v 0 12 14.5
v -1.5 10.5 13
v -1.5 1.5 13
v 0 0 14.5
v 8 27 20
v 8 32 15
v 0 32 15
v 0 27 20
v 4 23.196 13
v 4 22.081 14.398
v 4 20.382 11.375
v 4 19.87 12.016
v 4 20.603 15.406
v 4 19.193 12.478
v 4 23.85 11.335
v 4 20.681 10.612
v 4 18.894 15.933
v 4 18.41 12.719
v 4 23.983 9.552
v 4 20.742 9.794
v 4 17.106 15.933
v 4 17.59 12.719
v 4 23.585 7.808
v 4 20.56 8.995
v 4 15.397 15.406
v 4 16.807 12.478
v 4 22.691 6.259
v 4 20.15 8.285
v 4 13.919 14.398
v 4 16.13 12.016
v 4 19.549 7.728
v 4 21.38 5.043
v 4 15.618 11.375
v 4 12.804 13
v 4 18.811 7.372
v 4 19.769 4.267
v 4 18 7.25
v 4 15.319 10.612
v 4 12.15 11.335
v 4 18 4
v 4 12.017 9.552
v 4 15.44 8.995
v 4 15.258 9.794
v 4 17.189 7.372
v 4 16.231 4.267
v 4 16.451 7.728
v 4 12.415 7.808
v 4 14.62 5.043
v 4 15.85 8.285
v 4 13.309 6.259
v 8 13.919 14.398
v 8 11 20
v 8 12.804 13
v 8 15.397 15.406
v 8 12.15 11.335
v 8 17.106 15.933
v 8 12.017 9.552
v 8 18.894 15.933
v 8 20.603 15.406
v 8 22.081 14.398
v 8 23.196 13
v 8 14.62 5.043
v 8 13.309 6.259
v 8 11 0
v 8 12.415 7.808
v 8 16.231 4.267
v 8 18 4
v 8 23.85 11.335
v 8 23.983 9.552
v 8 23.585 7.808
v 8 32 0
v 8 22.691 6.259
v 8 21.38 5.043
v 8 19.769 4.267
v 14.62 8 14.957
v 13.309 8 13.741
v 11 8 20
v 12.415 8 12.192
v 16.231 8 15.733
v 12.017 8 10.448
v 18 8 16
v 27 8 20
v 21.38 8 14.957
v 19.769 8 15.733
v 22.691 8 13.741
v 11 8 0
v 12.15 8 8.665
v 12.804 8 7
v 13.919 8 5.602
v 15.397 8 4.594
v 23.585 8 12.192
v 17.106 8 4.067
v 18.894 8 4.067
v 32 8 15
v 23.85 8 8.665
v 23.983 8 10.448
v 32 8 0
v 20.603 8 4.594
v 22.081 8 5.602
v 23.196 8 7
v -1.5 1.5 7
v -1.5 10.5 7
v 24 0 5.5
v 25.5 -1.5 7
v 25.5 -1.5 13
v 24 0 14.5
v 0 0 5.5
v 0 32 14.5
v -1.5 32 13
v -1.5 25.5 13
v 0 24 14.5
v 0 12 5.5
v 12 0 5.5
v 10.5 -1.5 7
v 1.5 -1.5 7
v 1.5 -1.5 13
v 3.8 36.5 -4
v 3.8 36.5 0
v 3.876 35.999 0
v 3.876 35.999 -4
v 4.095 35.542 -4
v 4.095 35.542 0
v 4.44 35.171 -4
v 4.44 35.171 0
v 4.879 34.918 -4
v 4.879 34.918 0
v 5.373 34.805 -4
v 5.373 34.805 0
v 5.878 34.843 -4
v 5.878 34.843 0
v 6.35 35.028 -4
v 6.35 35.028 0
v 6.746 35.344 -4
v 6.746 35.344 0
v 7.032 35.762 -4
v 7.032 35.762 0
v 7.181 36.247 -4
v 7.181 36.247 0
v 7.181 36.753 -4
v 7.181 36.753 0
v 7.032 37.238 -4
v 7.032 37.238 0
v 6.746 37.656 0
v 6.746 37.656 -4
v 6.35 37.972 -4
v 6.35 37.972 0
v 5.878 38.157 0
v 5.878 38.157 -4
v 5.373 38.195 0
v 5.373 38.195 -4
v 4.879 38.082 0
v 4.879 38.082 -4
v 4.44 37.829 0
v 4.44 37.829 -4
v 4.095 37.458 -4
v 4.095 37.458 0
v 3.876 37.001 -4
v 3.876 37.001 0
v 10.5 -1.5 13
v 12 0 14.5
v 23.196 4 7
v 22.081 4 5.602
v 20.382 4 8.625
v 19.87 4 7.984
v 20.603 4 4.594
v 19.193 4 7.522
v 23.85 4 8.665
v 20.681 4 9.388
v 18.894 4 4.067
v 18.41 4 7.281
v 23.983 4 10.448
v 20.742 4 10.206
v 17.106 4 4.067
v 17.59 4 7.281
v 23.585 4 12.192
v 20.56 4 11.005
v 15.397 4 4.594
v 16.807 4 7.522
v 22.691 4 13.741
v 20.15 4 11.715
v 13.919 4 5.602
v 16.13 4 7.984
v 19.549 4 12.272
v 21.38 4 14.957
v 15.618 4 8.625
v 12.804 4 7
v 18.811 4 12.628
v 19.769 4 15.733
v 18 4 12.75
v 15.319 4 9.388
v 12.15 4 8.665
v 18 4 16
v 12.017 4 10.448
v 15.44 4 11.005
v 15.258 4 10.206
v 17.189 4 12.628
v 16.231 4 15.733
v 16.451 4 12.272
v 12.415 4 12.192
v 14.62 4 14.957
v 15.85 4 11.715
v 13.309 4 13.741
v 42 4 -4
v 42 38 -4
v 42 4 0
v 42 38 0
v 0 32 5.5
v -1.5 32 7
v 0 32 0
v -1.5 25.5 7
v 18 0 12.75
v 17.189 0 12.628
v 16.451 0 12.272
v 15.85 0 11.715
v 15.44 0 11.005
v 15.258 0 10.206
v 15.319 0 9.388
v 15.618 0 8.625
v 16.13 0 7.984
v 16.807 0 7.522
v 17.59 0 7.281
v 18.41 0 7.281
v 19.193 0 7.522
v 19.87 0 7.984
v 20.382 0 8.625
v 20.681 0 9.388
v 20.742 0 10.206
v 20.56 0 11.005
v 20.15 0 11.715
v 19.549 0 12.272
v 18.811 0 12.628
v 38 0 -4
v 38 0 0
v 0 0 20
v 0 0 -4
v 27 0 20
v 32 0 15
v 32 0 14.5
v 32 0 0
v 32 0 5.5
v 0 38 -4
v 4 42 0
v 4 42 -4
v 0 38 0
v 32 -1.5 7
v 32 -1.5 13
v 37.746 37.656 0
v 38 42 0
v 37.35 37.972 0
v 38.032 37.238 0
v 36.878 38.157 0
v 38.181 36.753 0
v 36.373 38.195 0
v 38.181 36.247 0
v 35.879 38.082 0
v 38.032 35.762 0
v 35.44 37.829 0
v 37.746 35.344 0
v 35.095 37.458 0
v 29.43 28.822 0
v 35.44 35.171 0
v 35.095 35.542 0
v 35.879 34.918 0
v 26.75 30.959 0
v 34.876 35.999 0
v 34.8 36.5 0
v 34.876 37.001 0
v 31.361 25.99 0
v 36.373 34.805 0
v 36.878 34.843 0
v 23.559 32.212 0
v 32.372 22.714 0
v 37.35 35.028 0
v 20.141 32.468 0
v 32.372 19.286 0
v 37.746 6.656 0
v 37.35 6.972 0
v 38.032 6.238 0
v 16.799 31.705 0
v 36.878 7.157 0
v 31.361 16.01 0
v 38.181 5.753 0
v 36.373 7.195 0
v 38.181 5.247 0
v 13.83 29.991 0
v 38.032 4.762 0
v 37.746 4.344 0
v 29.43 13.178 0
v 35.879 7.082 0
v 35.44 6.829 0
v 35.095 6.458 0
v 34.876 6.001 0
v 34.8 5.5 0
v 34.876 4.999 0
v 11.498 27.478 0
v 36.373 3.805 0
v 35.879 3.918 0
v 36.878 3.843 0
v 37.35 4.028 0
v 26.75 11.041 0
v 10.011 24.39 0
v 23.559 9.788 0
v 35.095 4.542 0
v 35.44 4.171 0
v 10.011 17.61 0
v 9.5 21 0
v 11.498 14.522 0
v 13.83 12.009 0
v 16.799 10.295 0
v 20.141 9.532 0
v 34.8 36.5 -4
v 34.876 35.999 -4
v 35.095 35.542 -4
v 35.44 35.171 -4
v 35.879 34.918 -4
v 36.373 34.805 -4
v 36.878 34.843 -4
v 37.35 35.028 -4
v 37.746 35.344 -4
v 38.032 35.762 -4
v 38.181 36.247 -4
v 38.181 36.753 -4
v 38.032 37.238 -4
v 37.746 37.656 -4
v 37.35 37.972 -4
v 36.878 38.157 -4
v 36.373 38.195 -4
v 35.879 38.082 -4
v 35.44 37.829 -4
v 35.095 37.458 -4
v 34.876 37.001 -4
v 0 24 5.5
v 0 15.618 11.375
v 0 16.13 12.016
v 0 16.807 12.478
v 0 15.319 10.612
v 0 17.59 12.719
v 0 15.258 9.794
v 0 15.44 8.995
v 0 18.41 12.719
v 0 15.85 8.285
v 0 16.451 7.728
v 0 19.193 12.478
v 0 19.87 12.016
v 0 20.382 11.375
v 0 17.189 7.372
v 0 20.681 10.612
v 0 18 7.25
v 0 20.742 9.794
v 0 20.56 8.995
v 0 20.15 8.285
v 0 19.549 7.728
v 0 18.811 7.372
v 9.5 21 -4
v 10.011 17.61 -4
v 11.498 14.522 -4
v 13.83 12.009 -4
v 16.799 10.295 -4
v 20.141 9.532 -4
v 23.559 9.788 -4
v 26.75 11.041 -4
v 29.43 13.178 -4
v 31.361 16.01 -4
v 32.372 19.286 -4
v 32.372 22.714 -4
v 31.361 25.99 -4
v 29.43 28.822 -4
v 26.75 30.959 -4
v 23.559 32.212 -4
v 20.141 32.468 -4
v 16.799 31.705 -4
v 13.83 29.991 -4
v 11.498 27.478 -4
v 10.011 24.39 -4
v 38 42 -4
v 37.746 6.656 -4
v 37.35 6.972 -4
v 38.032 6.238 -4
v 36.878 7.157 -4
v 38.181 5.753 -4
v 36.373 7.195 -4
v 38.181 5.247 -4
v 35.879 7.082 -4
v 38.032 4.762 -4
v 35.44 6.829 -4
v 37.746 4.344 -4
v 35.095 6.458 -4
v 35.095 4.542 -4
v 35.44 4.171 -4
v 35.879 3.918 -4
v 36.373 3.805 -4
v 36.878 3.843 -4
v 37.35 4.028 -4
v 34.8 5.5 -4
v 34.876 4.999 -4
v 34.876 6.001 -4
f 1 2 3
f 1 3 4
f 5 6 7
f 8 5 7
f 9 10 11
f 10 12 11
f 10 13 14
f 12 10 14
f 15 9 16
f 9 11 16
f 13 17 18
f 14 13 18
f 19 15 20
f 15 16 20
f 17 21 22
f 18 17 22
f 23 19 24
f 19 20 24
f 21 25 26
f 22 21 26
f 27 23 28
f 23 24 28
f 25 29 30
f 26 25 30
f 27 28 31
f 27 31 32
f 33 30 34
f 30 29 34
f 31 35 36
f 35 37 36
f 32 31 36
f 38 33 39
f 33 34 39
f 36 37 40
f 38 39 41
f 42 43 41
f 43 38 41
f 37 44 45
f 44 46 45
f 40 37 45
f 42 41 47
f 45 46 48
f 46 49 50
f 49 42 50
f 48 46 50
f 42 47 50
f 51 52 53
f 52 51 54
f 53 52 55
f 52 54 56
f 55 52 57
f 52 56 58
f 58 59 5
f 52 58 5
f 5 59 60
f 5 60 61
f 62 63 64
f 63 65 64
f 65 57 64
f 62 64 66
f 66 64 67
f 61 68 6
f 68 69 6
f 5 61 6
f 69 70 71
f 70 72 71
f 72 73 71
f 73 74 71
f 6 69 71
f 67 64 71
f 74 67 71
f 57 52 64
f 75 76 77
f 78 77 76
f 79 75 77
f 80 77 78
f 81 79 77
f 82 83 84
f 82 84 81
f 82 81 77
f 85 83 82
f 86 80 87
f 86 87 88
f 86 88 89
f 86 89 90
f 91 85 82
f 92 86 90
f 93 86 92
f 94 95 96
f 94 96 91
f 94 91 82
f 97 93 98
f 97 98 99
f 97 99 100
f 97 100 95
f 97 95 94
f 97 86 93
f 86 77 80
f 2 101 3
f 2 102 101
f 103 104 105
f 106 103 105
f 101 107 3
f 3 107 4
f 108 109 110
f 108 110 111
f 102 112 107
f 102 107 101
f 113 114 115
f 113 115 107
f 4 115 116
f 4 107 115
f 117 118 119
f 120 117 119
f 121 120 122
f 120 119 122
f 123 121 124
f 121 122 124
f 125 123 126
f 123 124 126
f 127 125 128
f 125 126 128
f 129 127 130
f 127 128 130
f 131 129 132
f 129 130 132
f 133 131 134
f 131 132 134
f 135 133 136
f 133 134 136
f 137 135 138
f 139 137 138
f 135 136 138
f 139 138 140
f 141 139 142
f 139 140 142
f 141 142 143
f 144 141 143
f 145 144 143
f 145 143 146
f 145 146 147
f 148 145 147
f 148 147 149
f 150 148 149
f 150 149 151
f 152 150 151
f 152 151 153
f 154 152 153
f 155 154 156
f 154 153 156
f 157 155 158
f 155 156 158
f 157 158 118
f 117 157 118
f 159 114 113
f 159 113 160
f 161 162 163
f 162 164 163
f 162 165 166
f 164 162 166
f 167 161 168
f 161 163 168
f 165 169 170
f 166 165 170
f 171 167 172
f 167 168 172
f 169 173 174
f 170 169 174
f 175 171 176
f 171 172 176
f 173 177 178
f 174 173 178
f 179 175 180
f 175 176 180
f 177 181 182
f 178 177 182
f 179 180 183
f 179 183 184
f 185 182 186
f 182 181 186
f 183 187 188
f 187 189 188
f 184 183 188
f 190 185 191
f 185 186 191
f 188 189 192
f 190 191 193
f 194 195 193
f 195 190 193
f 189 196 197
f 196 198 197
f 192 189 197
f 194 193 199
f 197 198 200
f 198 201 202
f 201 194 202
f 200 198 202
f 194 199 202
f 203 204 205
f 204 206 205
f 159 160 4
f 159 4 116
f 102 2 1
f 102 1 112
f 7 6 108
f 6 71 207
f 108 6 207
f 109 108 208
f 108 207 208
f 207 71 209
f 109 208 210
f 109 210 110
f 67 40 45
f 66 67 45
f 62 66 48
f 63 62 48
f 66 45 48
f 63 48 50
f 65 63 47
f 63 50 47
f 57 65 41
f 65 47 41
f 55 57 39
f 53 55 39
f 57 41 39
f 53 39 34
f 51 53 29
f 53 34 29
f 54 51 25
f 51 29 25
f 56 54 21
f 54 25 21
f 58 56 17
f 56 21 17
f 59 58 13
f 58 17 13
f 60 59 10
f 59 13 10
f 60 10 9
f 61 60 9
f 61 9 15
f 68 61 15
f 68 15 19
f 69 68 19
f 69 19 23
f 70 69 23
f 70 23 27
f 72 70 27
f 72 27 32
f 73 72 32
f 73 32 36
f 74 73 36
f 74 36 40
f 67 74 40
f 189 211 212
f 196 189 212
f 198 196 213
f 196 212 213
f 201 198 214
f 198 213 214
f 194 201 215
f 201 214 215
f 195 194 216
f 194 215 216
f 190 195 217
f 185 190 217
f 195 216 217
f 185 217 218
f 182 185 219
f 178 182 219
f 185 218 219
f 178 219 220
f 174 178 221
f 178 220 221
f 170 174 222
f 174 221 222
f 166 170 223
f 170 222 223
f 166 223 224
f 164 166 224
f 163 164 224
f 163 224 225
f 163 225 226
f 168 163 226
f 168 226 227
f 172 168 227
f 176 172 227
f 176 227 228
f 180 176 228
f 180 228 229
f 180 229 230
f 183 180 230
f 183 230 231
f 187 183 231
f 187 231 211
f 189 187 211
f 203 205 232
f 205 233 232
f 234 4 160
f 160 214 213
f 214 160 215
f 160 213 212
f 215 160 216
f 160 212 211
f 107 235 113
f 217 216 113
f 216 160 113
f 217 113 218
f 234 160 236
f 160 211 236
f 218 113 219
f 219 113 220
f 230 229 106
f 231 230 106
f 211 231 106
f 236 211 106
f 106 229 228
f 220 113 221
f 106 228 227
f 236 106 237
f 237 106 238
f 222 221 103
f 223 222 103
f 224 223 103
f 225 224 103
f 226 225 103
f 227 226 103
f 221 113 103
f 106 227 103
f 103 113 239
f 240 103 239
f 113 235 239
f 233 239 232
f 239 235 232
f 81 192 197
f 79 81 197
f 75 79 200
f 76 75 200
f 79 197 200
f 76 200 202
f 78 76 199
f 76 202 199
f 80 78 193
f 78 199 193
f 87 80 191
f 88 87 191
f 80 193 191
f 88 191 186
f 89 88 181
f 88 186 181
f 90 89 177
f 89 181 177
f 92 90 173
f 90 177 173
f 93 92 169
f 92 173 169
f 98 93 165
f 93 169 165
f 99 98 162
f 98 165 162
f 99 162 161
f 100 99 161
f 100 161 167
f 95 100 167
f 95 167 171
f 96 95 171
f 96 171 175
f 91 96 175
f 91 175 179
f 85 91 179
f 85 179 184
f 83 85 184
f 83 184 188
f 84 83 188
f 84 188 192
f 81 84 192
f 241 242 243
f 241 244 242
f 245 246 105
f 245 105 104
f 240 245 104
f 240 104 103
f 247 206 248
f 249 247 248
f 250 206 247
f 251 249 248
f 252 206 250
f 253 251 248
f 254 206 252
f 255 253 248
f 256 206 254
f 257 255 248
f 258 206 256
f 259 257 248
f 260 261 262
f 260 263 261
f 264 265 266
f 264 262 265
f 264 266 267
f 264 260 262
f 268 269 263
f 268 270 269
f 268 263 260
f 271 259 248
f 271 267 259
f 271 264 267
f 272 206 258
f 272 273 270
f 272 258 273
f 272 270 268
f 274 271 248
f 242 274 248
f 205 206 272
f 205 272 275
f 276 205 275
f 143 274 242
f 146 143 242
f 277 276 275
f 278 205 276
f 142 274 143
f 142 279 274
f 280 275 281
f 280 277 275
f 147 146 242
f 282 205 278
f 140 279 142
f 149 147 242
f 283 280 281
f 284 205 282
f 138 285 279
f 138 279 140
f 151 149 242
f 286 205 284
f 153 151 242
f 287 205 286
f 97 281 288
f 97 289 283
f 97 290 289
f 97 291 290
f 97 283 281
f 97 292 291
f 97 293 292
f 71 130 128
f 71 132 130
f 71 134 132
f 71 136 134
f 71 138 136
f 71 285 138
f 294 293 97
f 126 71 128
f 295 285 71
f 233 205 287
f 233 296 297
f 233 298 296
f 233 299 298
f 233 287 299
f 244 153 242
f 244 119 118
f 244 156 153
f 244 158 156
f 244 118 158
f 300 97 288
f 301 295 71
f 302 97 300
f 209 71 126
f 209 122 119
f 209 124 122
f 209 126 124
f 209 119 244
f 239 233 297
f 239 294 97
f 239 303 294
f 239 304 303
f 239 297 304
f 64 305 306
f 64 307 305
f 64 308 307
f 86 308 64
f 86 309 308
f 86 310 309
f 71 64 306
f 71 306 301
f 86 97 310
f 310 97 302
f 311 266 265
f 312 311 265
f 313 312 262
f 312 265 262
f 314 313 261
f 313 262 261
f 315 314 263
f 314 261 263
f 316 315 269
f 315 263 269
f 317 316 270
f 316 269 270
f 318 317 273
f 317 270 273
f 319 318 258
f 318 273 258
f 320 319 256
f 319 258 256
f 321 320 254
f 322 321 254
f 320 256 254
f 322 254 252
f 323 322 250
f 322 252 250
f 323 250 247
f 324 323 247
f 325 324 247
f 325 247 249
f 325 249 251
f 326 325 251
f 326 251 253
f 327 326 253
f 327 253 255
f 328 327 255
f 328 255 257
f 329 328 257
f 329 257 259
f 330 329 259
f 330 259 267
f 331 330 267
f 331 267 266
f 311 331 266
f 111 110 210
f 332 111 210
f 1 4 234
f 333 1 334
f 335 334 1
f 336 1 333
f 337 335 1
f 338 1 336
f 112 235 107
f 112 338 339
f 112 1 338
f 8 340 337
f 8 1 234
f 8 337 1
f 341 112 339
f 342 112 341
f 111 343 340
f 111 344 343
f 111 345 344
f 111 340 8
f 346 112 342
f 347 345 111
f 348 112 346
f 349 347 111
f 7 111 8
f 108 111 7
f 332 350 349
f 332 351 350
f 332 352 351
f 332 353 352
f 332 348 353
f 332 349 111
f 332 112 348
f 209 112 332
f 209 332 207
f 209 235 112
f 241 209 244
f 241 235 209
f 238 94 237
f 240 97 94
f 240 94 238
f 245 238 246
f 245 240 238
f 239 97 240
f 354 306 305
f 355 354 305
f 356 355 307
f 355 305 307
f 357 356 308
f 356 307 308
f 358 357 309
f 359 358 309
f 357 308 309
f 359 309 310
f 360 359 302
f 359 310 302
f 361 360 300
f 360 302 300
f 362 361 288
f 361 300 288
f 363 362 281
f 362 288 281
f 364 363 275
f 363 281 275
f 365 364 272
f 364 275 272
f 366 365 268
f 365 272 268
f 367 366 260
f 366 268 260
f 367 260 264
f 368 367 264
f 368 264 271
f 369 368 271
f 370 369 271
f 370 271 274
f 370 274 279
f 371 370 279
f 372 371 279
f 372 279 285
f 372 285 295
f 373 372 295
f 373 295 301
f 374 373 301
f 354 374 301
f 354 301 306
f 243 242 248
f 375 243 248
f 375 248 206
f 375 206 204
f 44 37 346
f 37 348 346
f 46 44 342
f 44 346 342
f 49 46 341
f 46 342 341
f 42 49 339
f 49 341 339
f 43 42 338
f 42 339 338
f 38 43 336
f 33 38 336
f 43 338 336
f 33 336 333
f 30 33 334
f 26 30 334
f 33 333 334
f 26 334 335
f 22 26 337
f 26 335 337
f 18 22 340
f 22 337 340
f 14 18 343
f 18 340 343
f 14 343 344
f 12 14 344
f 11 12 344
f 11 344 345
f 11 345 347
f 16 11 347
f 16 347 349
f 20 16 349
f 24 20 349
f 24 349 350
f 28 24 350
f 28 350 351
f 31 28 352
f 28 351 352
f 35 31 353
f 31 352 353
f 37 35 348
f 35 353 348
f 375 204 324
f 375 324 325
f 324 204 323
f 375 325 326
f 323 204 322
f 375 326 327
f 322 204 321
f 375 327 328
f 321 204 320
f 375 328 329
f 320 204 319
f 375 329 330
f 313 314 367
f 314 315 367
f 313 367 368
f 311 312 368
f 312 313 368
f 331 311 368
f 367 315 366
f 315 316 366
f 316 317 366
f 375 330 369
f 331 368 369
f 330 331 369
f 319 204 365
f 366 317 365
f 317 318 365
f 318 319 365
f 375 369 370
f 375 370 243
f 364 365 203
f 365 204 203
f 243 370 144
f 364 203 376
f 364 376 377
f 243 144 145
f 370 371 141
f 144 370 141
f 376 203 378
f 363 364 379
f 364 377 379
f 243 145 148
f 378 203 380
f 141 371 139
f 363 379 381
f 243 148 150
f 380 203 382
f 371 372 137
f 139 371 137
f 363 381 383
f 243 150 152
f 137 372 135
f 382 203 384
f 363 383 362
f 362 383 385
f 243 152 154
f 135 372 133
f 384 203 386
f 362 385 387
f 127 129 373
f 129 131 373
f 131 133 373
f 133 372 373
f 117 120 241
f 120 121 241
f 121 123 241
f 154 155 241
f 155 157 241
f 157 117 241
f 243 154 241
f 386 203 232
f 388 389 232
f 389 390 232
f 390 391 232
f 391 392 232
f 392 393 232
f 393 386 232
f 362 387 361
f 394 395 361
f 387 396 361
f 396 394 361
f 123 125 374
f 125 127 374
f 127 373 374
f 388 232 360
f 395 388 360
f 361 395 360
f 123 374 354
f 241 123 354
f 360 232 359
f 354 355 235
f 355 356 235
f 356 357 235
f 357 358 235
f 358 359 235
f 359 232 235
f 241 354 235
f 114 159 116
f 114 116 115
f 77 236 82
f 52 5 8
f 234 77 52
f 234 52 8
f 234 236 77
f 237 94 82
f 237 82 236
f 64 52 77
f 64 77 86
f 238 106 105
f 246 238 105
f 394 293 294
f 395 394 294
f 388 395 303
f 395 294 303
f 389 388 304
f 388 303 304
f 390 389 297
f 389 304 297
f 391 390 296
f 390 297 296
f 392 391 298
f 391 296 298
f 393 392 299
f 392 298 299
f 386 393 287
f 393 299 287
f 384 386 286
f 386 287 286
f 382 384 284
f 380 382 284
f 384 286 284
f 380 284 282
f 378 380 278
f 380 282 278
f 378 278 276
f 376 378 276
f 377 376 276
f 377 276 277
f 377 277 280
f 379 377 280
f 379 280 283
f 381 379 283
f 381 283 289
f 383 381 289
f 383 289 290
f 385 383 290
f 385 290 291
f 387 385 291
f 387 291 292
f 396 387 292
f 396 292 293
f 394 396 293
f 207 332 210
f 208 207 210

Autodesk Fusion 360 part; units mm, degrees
sketch "Sketch1" plane through (0, 0, 0) normal (0, 0, 1) x (-1, 0, 0)
  line L0 (-42, -42) -> (-42, 0)
  circle A0 centre (-36.5, -36.5) radius 1.7
  circle A1 centre (-36.5, -5.5) radius 1.7
  circle A2 centre (-5.5, -5.5) radius 1.7 construction
  circle A3 centre (-5.5, -36.5) radius 1.7
  line L1 (-5.5, -36.5) -> (-36.5, -36.5) construction
  line L2 (-36.5, -5.5) -> (-5.5, -5.5) construction
  line L3 (-36.5, -36.5) -> (-36.5, -5.5) construction
  circle A4 centre (-21, -21) radius 11.5
  line L4 (0, 0) -> (0, -42)
  line L5 (0, 0) -> (-42, 0)
  line L6 (-5.5, -5.5) -> (-36.5, -36.5) construction
  line L7 (-5.5, -36.5) -> (-5.5, -5.5) construction
  line L8 (-8, -8) -> (-32, -8)
  line L9 (-32, -8) -> (-32, 0)
  line L10 (-8, -8) -> (-8, -32)
  line L11 (-8, -32) -> (0, -32)
  line L12 (0, -42) -> (-42, -42)
  circle A5 centre (-36.5, -5.5) radius 4 construction
  circle A6 centre (-5.5, -36.5) radius 4 construction
  dimension "d1130" = 31
  dimension "d1131" = 31
  dimension "d1132" = 3.4
  dimension "d1173" = 23
  dimension "d1184" = 0
  dimension "d1185" = 0
  dimension "d1186" = 0
  dimension "d1187" = 0
  dimension "d1331" = 42
  dimension "d1332" = 42
  dimension "d1339" = 0
  dimension "d1340" = 0
  dimension "d1341" = 0
  dimension "d1342" = 0
  dimension "d1367" = 0
  dimension "d1368" = 0
  dimension "d1369" = 0
  dimension "d1370" = 0
  dimension "d1450" = 0
  dimension "d1451" = 0
  dimension "d1452" = 0
  dimension "d1453" = 0
  dimension "d1458" = 0
  dimension "d1459" = 0
  dimension "d1460" = 0
  dimension "d1461" = 0
  dimension "d1615" = 0
  dimension "d1616" = 0
  dimension "d1617" = 0
  dimension "d1618" = 0
  dimension "d2598" = 32
  dimension "d2" = 32
  dimension "d4" = 20
  dimension "d181" = 5.5
  dimension "d182" = 8
  dimension "d199" = 0
  dimension "d200" = 0
  dimension "d201" = 0
  dimension "d202" = 0
  dimension "d277" = 8
extrude "Extrude1" add sketch "Sketch1" against normal blind 4
chamfer "Chamfer6" distance 4 angle 45 3 edges at (42, 0, -2) (0, 42, -2) (42, 42, -2)
extrude "Extrude6" add sketch "Sketch1" along normal blind 20 contours L4 L5 L8 L9 L10 L11
sketch "Sketch6" plane through (32, 0, 0) normal (1, 0, 0) x (0, 1, 0)
  line L0 (0, 0) -> (8, 0)
  line L1 (8, 0) -> (8, 20)
  line L2 (8, 20) -> (0, 20)
  line L3 (0, 20) -> (0, 0)
  line L4 (0, 10) -> (-1.5, 10) construction
  line L5 (0, 14.5) -> (-1.5, 13)
  line L6 (-1.5, 13) -> (-1.5, 7)
  line L7 (-1.5, 7) -> (0, 5.5)
  dimension "d7" = 1.5
  dimension "d8" = 6
extrude "Extrude11" add sketch "Sketch6" against normal blind 8 contours L3 L5 L6 L7
extrude "Extrude12" add 1 faces at (24, -0.5, 11) along direction (-1, 0, 0) blind 12 from surface at 12
ref_plane "WorkPlane1" through (0, 0, 8) normal (0.7071, -0.7071, 0) x (0, 0, -1)
mirror "Mirror1" about plane through (0, 0, 8) normal (0.7071, -0.7071, 0) of "Extrude11", "Extrude12"
hole "Hole3" at (18, 8, 10) direction (0, -1, 0) diameter 5.5 depth 19 tip angle 118 counterbore diameter 12 counterbore depth 4
hole "Hole4" at (8, 18, 10) direction (-1, 0, 0) diameter 5.5 depth 12 tip angle 118 counterbore diameter 12 counterbore depth 4
chamfer "Chamfer4" distance 5 angle 45 2 edges at (32, 4, 20) (4, 32, 20)
chamfer "Chamfer7" distance 1.5 angle 45 6 edges at (12, -1.5, 10) (24, -1.5, 10) (-1.5, 12, 10) (-1.5, 24, 10) (0, -1.5, 10) (-1.5, 0, 10)
chamfer "Chamfer8" distance 3 angle 45 1 edges at (8, 8, 10)
equation "d1131 = d1130"
equation "d1332 = d1331"
equation "d2 = d2598"
